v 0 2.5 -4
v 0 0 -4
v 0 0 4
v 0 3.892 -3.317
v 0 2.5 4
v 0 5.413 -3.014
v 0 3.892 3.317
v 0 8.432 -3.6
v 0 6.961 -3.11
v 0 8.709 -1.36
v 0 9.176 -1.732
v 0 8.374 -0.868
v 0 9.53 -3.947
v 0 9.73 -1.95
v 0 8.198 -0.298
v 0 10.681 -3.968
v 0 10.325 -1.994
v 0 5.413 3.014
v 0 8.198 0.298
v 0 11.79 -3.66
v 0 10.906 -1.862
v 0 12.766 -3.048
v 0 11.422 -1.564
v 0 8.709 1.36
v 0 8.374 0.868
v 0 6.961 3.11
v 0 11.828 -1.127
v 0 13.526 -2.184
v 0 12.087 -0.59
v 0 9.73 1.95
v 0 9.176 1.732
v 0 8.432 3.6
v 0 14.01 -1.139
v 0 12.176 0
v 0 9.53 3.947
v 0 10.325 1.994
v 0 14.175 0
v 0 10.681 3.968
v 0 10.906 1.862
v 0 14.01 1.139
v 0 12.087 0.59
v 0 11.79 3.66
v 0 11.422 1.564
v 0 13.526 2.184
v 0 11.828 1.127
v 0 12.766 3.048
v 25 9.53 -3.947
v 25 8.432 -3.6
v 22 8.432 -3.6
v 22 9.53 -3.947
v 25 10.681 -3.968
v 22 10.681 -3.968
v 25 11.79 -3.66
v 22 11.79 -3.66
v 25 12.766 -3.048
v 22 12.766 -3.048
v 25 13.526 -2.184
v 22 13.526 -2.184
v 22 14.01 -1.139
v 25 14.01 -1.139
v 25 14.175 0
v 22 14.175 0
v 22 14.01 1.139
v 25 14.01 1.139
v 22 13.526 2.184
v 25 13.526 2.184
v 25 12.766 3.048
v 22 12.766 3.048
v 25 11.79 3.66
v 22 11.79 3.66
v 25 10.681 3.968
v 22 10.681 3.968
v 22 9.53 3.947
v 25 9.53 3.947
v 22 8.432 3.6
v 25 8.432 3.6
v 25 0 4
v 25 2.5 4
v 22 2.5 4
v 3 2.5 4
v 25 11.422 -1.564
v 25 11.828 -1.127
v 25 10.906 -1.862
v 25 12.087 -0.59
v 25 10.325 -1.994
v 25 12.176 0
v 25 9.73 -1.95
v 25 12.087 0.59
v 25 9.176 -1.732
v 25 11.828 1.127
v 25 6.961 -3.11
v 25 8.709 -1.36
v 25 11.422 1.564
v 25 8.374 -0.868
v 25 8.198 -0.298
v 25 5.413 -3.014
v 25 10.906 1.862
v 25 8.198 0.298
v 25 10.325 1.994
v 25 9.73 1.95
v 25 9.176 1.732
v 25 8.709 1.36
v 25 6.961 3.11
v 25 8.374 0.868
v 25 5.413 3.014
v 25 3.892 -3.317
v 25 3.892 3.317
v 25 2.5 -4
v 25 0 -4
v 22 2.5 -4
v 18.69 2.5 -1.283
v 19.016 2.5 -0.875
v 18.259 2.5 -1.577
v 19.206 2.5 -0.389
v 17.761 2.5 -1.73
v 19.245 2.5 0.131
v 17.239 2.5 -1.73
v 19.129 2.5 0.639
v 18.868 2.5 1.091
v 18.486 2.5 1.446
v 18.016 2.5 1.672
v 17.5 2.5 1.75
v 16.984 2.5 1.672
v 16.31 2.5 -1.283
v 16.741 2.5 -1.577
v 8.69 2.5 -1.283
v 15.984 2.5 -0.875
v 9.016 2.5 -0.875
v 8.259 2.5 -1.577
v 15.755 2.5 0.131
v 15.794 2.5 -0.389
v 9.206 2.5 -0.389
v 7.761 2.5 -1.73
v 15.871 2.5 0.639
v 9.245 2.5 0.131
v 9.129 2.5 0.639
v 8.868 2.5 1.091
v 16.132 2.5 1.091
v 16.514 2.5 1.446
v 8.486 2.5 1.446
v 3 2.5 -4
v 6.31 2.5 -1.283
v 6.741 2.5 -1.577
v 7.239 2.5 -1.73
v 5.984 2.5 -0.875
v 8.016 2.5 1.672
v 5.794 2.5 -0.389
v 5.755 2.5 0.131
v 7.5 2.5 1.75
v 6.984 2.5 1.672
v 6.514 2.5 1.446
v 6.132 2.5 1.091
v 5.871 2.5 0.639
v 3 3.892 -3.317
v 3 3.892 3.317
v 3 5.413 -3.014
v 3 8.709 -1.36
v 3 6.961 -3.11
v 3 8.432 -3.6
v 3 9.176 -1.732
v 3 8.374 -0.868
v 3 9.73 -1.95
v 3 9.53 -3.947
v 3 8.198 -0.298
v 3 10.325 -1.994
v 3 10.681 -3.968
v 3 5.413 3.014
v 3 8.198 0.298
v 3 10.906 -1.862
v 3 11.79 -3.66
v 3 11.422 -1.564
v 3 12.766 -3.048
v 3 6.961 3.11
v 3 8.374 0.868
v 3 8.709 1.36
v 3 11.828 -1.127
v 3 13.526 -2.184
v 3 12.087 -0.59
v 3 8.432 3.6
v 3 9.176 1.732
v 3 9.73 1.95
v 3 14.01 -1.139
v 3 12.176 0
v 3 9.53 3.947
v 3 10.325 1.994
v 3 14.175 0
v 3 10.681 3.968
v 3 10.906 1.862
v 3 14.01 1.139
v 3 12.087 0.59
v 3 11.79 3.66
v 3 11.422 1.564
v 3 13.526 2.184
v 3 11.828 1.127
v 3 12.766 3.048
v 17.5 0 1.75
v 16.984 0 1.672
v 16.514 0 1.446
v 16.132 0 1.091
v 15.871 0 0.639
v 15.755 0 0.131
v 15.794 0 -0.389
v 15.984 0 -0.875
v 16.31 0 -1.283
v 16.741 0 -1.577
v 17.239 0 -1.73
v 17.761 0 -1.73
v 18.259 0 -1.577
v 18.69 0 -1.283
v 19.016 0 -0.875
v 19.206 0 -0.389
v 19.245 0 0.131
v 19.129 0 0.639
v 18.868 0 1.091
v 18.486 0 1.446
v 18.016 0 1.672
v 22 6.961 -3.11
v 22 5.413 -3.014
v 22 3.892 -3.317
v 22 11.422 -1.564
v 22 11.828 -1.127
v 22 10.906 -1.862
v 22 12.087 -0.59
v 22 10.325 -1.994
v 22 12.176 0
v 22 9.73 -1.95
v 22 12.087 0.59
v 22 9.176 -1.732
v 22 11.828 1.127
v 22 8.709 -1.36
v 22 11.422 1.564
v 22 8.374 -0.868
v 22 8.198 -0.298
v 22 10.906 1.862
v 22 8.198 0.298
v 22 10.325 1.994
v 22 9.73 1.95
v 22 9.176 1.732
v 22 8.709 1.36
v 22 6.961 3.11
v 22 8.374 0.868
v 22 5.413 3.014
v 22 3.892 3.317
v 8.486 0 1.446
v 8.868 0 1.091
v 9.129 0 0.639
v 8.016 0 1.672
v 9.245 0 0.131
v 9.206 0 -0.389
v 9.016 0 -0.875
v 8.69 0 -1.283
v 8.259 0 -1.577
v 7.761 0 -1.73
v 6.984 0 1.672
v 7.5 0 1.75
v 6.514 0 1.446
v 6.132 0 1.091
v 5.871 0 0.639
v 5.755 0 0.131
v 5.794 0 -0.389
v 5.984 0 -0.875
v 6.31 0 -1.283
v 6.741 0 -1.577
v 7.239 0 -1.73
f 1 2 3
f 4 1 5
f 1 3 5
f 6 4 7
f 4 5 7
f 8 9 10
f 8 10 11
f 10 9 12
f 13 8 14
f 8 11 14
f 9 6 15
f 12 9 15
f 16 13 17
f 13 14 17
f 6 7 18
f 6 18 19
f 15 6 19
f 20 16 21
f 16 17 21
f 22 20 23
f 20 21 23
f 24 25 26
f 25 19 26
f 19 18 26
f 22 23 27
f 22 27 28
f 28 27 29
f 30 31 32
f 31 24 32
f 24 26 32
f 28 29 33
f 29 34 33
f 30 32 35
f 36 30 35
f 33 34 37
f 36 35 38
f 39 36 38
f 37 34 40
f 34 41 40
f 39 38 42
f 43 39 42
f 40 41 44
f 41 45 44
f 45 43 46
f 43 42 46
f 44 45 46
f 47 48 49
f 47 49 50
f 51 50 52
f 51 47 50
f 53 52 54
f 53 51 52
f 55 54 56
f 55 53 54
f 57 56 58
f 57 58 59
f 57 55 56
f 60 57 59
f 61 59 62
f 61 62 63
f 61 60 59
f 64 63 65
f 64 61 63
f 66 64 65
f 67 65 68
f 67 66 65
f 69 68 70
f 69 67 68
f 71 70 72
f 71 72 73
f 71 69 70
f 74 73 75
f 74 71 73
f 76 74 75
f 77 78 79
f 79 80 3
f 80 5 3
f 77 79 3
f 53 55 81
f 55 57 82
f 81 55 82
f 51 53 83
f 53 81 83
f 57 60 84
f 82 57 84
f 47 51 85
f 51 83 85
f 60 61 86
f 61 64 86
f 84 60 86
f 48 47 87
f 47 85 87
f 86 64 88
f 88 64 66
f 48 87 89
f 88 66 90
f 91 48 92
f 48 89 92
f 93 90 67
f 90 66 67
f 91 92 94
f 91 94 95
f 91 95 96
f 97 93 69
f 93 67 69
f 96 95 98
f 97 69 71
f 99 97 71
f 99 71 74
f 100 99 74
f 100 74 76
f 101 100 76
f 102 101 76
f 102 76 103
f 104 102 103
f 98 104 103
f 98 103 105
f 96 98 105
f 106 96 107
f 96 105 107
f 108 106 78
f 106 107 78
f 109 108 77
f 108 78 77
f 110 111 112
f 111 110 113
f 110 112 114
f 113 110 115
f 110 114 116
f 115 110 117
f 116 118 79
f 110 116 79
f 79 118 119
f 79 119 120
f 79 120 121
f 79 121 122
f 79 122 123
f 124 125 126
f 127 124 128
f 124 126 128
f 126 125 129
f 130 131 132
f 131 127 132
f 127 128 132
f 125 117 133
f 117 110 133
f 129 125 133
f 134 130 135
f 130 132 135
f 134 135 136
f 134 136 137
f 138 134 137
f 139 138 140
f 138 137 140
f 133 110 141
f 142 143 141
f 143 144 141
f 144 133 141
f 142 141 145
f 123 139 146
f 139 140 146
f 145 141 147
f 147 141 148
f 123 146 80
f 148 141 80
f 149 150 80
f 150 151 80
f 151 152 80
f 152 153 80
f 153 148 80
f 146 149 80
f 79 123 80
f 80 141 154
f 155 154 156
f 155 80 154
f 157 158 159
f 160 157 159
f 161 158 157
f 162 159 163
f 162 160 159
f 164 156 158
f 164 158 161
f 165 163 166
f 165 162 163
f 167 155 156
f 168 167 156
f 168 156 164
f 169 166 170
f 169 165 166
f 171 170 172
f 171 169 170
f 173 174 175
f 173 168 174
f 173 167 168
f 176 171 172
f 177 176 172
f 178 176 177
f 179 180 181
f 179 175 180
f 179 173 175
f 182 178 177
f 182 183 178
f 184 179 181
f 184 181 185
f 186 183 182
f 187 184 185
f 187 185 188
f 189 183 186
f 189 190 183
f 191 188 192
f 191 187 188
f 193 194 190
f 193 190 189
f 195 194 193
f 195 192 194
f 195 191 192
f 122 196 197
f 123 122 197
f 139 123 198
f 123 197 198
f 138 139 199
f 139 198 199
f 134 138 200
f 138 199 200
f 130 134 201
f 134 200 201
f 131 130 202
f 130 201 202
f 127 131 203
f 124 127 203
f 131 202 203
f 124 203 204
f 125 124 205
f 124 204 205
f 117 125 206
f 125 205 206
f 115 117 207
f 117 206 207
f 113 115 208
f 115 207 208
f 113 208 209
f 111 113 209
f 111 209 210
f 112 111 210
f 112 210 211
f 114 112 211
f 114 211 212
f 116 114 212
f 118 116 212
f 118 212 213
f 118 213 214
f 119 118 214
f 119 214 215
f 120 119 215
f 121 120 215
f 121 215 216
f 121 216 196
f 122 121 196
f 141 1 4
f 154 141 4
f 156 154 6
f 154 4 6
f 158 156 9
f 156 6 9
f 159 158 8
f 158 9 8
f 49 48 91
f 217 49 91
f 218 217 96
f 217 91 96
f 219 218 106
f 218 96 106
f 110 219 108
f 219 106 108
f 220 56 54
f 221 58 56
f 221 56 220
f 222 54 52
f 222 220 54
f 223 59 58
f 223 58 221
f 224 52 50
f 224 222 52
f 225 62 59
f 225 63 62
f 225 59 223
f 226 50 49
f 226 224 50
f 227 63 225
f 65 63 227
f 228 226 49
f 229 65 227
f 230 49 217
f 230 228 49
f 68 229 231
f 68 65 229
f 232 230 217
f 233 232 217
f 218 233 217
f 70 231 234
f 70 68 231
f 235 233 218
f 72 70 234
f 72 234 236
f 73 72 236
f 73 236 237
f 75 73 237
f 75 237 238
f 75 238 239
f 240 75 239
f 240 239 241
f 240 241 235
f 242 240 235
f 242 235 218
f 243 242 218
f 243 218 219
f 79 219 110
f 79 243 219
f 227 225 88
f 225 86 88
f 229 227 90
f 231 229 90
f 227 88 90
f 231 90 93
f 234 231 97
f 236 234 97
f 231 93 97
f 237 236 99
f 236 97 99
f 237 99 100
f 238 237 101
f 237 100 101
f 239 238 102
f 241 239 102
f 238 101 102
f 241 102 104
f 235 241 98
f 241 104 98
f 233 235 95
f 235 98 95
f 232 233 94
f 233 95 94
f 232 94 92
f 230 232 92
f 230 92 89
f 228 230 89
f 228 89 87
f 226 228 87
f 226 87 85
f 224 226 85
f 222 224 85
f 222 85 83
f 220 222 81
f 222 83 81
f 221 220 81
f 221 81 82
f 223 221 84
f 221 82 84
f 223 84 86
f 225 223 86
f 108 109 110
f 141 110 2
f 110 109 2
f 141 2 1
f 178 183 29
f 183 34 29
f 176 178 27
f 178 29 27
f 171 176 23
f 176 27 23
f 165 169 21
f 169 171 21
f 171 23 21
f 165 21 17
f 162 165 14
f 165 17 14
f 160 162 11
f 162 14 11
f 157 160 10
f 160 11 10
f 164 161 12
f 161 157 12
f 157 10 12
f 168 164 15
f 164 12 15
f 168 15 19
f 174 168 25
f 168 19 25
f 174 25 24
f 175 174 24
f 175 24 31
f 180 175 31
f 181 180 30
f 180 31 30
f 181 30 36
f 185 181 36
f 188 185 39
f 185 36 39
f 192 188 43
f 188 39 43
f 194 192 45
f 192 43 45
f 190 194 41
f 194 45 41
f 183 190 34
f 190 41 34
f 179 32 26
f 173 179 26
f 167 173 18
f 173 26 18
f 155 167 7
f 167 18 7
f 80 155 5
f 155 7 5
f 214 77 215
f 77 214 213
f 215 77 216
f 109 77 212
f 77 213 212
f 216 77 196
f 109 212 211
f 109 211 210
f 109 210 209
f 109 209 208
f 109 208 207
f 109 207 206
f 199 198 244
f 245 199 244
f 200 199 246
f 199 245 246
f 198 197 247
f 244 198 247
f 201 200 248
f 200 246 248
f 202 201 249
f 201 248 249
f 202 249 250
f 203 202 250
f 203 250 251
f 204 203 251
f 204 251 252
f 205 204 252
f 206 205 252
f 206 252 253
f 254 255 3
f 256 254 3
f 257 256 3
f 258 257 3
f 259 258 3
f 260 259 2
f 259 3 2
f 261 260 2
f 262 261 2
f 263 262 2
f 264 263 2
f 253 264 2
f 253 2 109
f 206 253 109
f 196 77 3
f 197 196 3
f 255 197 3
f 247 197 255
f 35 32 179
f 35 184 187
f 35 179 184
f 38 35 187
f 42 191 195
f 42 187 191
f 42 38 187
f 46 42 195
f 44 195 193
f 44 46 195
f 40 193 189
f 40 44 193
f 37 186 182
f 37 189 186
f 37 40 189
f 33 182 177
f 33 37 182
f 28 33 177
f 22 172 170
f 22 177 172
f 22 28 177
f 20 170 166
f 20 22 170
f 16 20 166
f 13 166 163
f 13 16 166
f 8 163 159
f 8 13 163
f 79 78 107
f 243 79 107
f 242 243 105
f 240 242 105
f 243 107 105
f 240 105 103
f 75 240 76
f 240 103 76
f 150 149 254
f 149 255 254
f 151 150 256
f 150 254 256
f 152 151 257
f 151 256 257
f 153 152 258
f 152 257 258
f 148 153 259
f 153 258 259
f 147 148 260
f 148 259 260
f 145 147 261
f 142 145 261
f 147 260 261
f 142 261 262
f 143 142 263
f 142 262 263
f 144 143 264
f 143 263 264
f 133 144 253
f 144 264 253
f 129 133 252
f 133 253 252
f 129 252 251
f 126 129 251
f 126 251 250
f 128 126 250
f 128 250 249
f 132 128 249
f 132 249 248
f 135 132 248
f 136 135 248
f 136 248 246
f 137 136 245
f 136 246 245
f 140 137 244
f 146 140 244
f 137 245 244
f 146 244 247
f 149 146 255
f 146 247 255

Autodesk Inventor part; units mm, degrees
ref_plane "XZ Plane" through (0, 0, 0) normal (0, 1, 0) x (-1, 0, 0)
ref_plane "XY Plane" through (0, 0, 0) normal (0, 0, 1) x (1, 0, 0)
sketch "Skizze1" plane through (0, 0, 0) normal (1, 0, 0) x (0, 1, 0)
  line L0 (0, 0) -> (13, 0) construction
  line L1 (0, 0) -> (13, 0) construction
  line L2 (2.5, 4) -> (0, 4)
  line L3 (0, 4) -> (0, -4)
  line L4 (0, -4) -> (2.5, -4)
  line L5 (2.5, -4) -> (2.5, 4)
  arc A0 (2.5, 4) -> (8.432, 3.6) centre (5.8166, 9) ccw
  arc A1 (8.432, -3.6) -> (2.5, -4) centre (5.8166, -9) ccw
  arc A2 (8.432, -3.6) -> (8.432, 3.6) centre (10.1755, 0) ccw
  circle A3 centre (10.1755, 0) radius 2
  dimension "d7" = 13
  dimension "d9" = 2.5
  dimension "d10" = 12
  dimension "d11" = 12
  dimension "d15" = 8
  dimension "d16" = 18
  dimension "d21" = 4
extrude "Extrusion1" add sketch "Skizze1" along normal blind 25 contours L5 L4 L3 L2
extrude "Extrusion2" add sketch "Skizze1" along normal blind 3 contours A0 A2 A1 L5
ref_plane "Arbeitsebene1" through (12.5, 0, 0) normal (1, 0, 0) x (0, 1, 0)
mirror "Spiegeln1" about plane through (12.5, 0, 0) normal (1, 0, 0) of "Extrusion2"
sketch "Skizze2" plane through (3, 2.5, 4) normal (0, 1, 0) x (1, 0, 0)
  line L0 (-3, 0) -> (-3, 8) projected
  line L1 (0, 0) -> (0, 8) projected
  point P0 (-3, 4)
  point P1 (4.5, 4)
  point P2 (14.5, 4)
  point P3 (-3, 4)
  point P4 (-3, 7.6)
  point P5 (-3, 0.4)
  point P6 (0, 7.6)
  point P7 (0, 0.4)
  dimension "d30" = 10
  dimension "d31" = 4.5
hole "Bohrung1" at (7.5, 2.5, 0) at (17.5, 2.5, 0) direction (0, -1, 0) diameter 3.5 depth 2.5
properties part number "kipphebellagerbock"
